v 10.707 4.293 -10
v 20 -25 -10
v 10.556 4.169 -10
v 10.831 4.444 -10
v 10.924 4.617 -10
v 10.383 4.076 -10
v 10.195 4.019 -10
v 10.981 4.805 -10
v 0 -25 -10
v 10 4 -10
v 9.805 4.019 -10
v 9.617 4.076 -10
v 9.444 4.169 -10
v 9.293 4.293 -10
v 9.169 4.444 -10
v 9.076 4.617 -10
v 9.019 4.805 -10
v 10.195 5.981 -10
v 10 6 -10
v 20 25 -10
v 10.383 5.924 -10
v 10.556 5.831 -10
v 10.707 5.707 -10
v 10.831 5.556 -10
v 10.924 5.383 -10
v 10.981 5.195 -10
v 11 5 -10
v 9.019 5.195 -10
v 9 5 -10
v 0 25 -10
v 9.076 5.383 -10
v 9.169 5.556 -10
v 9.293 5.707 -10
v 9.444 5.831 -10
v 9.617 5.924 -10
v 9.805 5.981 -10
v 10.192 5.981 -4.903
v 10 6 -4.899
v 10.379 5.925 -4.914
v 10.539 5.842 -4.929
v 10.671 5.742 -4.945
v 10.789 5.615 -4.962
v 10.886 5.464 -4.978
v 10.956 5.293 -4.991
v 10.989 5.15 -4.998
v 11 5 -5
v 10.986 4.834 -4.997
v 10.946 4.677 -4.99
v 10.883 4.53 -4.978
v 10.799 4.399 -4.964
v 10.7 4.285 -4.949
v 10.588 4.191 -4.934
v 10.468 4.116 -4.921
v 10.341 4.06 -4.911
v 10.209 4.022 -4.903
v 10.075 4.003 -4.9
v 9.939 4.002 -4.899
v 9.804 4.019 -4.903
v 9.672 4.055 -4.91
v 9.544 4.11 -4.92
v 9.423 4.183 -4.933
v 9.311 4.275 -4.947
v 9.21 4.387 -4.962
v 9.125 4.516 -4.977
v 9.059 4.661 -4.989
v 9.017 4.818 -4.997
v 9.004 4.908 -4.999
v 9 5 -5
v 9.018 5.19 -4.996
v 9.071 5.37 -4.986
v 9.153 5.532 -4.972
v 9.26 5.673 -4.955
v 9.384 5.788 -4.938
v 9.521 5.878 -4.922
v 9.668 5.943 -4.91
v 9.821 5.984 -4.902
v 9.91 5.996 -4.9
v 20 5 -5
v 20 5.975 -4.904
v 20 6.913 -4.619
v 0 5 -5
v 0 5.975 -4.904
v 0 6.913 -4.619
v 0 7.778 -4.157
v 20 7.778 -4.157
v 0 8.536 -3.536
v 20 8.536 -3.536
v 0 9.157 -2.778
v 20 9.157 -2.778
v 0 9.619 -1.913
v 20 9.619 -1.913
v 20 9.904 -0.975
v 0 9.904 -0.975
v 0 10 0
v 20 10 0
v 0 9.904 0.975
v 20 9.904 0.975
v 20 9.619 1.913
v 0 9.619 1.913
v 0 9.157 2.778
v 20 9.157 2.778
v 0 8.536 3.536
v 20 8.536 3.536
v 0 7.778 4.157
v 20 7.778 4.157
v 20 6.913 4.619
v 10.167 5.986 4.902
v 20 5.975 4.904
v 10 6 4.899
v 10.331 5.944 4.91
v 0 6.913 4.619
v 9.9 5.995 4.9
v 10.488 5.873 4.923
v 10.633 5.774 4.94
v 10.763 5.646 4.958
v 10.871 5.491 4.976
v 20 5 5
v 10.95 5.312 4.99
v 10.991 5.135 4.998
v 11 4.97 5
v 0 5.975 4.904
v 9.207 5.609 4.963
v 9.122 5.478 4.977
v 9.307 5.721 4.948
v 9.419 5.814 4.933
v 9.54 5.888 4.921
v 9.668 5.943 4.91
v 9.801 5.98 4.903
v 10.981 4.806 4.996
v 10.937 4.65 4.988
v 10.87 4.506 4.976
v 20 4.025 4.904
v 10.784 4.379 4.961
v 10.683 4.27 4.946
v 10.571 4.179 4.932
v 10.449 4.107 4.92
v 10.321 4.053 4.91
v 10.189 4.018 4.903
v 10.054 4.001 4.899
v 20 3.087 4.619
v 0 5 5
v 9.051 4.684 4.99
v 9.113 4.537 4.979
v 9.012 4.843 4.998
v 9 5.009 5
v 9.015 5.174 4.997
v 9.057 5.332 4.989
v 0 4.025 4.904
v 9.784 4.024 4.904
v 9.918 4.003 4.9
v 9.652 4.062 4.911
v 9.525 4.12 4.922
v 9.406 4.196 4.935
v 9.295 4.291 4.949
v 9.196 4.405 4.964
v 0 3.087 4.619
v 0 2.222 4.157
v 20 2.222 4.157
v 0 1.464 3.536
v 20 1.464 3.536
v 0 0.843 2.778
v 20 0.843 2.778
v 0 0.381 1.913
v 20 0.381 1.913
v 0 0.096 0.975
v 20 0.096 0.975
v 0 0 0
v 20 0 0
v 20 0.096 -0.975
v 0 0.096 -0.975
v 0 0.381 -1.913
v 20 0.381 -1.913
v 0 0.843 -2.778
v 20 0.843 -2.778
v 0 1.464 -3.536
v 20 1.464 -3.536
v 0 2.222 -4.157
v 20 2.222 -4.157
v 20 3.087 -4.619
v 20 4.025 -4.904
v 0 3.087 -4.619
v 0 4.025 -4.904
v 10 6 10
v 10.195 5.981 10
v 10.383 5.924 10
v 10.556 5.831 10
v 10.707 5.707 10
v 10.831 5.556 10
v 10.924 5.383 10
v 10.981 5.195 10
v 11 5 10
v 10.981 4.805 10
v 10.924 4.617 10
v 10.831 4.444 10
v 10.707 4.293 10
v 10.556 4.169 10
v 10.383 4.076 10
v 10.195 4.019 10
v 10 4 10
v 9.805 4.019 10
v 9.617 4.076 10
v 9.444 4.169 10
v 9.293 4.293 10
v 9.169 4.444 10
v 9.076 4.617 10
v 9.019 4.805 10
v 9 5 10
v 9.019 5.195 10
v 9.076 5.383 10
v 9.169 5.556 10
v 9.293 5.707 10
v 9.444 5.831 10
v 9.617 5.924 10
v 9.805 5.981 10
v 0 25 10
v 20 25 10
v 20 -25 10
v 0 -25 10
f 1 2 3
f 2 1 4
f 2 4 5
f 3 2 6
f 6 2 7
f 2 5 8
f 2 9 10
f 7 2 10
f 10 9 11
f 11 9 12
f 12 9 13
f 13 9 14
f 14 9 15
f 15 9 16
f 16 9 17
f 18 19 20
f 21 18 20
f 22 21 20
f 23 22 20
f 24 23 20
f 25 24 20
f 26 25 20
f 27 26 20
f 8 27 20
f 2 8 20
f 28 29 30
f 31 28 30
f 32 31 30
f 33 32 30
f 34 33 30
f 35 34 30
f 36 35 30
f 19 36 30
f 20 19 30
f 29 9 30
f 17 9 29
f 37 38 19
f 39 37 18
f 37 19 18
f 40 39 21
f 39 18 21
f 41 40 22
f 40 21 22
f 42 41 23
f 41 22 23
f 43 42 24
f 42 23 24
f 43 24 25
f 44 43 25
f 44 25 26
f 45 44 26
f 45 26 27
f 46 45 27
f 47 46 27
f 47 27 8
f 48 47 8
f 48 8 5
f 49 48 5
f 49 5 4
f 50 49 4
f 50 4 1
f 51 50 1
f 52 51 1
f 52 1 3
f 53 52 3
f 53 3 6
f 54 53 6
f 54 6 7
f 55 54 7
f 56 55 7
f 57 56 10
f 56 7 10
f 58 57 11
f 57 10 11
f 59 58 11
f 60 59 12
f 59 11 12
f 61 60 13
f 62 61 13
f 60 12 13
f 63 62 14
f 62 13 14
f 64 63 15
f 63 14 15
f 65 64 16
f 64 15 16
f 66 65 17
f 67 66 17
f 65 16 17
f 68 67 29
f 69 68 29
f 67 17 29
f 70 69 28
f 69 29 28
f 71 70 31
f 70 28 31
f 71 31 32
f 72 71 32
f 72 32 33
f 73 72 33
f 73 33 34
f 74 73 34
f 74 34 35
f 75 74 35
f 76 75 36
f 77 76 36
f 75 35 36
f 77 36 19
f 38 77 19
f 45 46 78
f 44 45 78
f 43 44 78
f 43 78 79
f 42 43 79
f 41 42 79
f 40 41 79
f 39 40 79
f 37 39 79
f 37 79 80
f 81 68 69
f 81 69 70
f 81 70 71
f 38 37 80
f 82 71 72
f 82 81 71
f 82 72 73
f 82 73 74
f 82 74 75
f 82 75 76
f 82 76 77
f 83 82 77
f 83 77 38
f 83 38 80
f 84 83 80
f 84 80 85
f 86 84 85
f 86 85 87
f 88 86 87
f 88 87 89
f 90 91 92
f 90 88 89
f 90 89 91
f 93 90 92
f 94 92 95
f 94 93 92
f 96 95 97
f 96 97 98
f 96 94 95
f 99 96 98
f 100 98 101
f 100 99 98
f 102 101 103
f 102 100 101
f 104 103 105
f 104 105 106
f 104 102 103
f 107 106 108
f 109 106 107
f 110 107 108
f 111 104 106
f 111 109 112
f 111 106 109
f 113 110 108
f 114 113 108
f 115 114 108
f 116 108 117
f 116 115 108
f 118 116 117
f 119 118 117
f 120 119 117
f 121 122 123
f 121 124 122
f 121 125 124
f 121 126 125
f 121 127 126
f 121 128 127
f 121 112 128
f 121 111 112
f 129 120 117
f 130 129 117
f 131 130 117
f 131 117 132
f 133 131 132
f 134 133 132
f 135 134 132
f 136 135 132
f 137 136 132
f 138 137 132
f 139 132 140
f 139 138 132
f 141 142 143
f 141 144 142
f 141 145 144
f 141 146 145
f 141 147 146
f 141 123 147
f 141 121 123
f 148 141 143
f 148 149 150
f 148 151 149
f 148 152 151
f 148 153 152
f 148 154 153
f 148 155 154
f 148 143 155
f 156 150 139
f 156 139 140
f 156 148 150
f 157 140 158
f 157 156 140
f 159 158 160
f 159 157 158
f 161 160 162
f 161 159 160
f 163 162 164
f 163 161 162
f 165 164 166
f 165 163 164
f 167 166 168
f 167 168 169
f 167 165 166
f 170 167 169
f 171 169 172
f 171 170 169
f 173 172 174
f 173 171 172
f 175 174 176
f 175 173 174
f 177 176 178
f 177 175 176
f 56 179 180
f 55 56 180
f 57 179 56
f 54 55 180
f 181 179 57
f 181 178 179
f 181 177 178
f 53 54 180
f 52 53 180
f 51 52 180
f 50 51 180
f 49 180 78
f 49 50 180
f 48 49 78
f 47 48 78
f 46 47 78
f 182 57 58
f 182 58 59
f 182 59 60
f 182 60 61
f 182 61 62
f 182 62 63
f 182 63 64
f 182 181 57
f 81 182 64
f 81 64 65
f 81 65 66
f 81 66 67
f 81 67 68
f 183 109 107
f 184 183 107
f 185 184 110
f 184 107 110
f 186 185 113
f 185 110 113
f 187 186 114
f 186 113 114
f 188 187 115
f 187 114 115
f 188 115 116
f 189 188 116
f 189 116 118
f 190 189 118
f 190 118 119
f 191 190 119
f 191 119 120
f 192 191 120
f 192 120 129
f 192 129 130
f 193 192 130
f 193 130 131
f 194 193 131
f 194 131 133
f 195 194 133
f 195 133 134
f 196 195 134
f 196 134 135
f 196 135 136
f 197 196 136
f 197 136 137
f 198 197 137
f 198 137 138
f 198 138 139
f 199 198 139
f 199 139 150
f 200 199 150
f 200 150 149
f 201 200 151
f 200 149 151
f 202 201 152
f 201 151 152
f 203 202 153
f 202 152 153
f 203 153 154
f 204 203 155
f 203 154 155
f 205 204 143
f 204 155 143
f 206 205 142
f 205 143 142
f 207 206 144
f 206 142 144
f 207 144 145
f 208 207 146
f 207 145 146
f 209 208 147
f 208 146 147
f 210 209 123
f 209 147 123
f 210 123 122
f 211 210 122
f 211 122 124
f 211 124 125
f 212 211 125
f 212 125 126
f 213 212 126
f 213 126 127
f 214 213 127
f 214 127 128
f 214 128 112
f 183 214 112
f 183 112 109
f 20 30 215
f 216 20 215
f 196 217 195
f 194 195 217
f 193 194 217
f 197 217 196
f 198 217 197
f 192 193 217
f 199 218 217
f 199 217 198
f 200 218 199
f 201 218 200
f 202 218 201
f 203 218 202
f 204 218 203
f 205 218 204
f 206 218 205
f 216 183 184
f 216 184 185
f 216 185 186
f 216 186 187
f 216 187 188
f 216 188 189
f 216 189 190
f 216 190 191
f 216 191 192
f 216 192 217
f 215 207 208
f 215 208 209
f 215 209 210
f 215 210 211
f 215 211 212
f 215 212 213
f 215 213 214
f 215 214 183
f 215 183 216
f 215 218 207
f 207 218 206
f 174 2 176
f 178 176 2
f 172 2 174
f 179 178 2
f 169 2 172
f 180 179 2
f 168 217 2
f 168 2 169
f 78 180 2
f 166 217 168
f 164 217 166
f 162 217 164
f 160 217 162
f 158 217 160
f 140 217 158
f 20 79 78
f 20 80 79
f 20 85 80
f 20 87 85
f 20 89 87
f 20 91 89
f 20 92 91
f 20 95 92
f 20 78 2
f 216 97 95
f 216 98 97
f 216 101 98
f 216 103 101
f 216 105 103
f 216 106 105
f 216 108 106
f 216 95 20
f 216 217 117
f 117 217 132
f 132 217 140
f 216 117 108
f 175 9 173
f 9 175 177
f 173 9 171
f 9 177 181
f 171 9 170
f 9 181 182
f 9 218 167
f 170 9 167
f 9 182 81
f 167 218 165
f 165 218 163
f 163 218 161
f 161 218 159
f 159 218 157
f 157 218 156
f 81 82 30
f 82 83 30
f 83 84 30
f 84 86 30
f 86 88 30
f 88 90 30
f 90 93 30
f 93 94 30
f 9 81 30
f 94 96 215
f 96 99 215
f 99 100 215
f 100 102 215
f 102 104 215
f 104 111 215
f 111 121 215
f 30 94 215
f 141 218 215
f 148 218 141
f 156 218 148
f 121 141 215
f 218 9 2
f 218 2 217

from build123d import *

# Parameters (mm, degrees)
SKETCH1_W           = 50
SKETCH1_H           = 20
SKETCH1_R           = 5
BOSS_EXTRUDE3_DEPTH = 20
SKETCH2_R           = 1
CUT_EXTRUDE1_DEPTH  = 38.749172176


with BuildPart() as part:
    # Sketch1 → Boss-Extrude3 (new body)
    with BuildSketch(Plane.YZ):
        Rectangle(SKETCH1_W, SKETCH1_H)
        with Locations(Location((5, 0, 0), (0, 0, 270))):
            Circle(SKETCH1_R, mode=Mode.SUBTRACT)
    extrude(amount=BOSS_EXTRUDE3_DEPTH)

    # Sketch2 → Cut-Extrude1 (cut, through all)
    with BuildSketch(Plane(origin=(0, 0, -10), x_dir=(1, 0, 0), z_dir=(0, 0, -1))):
        with Locations(Location((10, -5, 0), (0, 0, 270))):
            Circle(SKETCH2_R)
    extrude(amount=-CUT_EXTRUDE1_DEPTH, mode=Mode.SUBTRACT)


solid = part.part
